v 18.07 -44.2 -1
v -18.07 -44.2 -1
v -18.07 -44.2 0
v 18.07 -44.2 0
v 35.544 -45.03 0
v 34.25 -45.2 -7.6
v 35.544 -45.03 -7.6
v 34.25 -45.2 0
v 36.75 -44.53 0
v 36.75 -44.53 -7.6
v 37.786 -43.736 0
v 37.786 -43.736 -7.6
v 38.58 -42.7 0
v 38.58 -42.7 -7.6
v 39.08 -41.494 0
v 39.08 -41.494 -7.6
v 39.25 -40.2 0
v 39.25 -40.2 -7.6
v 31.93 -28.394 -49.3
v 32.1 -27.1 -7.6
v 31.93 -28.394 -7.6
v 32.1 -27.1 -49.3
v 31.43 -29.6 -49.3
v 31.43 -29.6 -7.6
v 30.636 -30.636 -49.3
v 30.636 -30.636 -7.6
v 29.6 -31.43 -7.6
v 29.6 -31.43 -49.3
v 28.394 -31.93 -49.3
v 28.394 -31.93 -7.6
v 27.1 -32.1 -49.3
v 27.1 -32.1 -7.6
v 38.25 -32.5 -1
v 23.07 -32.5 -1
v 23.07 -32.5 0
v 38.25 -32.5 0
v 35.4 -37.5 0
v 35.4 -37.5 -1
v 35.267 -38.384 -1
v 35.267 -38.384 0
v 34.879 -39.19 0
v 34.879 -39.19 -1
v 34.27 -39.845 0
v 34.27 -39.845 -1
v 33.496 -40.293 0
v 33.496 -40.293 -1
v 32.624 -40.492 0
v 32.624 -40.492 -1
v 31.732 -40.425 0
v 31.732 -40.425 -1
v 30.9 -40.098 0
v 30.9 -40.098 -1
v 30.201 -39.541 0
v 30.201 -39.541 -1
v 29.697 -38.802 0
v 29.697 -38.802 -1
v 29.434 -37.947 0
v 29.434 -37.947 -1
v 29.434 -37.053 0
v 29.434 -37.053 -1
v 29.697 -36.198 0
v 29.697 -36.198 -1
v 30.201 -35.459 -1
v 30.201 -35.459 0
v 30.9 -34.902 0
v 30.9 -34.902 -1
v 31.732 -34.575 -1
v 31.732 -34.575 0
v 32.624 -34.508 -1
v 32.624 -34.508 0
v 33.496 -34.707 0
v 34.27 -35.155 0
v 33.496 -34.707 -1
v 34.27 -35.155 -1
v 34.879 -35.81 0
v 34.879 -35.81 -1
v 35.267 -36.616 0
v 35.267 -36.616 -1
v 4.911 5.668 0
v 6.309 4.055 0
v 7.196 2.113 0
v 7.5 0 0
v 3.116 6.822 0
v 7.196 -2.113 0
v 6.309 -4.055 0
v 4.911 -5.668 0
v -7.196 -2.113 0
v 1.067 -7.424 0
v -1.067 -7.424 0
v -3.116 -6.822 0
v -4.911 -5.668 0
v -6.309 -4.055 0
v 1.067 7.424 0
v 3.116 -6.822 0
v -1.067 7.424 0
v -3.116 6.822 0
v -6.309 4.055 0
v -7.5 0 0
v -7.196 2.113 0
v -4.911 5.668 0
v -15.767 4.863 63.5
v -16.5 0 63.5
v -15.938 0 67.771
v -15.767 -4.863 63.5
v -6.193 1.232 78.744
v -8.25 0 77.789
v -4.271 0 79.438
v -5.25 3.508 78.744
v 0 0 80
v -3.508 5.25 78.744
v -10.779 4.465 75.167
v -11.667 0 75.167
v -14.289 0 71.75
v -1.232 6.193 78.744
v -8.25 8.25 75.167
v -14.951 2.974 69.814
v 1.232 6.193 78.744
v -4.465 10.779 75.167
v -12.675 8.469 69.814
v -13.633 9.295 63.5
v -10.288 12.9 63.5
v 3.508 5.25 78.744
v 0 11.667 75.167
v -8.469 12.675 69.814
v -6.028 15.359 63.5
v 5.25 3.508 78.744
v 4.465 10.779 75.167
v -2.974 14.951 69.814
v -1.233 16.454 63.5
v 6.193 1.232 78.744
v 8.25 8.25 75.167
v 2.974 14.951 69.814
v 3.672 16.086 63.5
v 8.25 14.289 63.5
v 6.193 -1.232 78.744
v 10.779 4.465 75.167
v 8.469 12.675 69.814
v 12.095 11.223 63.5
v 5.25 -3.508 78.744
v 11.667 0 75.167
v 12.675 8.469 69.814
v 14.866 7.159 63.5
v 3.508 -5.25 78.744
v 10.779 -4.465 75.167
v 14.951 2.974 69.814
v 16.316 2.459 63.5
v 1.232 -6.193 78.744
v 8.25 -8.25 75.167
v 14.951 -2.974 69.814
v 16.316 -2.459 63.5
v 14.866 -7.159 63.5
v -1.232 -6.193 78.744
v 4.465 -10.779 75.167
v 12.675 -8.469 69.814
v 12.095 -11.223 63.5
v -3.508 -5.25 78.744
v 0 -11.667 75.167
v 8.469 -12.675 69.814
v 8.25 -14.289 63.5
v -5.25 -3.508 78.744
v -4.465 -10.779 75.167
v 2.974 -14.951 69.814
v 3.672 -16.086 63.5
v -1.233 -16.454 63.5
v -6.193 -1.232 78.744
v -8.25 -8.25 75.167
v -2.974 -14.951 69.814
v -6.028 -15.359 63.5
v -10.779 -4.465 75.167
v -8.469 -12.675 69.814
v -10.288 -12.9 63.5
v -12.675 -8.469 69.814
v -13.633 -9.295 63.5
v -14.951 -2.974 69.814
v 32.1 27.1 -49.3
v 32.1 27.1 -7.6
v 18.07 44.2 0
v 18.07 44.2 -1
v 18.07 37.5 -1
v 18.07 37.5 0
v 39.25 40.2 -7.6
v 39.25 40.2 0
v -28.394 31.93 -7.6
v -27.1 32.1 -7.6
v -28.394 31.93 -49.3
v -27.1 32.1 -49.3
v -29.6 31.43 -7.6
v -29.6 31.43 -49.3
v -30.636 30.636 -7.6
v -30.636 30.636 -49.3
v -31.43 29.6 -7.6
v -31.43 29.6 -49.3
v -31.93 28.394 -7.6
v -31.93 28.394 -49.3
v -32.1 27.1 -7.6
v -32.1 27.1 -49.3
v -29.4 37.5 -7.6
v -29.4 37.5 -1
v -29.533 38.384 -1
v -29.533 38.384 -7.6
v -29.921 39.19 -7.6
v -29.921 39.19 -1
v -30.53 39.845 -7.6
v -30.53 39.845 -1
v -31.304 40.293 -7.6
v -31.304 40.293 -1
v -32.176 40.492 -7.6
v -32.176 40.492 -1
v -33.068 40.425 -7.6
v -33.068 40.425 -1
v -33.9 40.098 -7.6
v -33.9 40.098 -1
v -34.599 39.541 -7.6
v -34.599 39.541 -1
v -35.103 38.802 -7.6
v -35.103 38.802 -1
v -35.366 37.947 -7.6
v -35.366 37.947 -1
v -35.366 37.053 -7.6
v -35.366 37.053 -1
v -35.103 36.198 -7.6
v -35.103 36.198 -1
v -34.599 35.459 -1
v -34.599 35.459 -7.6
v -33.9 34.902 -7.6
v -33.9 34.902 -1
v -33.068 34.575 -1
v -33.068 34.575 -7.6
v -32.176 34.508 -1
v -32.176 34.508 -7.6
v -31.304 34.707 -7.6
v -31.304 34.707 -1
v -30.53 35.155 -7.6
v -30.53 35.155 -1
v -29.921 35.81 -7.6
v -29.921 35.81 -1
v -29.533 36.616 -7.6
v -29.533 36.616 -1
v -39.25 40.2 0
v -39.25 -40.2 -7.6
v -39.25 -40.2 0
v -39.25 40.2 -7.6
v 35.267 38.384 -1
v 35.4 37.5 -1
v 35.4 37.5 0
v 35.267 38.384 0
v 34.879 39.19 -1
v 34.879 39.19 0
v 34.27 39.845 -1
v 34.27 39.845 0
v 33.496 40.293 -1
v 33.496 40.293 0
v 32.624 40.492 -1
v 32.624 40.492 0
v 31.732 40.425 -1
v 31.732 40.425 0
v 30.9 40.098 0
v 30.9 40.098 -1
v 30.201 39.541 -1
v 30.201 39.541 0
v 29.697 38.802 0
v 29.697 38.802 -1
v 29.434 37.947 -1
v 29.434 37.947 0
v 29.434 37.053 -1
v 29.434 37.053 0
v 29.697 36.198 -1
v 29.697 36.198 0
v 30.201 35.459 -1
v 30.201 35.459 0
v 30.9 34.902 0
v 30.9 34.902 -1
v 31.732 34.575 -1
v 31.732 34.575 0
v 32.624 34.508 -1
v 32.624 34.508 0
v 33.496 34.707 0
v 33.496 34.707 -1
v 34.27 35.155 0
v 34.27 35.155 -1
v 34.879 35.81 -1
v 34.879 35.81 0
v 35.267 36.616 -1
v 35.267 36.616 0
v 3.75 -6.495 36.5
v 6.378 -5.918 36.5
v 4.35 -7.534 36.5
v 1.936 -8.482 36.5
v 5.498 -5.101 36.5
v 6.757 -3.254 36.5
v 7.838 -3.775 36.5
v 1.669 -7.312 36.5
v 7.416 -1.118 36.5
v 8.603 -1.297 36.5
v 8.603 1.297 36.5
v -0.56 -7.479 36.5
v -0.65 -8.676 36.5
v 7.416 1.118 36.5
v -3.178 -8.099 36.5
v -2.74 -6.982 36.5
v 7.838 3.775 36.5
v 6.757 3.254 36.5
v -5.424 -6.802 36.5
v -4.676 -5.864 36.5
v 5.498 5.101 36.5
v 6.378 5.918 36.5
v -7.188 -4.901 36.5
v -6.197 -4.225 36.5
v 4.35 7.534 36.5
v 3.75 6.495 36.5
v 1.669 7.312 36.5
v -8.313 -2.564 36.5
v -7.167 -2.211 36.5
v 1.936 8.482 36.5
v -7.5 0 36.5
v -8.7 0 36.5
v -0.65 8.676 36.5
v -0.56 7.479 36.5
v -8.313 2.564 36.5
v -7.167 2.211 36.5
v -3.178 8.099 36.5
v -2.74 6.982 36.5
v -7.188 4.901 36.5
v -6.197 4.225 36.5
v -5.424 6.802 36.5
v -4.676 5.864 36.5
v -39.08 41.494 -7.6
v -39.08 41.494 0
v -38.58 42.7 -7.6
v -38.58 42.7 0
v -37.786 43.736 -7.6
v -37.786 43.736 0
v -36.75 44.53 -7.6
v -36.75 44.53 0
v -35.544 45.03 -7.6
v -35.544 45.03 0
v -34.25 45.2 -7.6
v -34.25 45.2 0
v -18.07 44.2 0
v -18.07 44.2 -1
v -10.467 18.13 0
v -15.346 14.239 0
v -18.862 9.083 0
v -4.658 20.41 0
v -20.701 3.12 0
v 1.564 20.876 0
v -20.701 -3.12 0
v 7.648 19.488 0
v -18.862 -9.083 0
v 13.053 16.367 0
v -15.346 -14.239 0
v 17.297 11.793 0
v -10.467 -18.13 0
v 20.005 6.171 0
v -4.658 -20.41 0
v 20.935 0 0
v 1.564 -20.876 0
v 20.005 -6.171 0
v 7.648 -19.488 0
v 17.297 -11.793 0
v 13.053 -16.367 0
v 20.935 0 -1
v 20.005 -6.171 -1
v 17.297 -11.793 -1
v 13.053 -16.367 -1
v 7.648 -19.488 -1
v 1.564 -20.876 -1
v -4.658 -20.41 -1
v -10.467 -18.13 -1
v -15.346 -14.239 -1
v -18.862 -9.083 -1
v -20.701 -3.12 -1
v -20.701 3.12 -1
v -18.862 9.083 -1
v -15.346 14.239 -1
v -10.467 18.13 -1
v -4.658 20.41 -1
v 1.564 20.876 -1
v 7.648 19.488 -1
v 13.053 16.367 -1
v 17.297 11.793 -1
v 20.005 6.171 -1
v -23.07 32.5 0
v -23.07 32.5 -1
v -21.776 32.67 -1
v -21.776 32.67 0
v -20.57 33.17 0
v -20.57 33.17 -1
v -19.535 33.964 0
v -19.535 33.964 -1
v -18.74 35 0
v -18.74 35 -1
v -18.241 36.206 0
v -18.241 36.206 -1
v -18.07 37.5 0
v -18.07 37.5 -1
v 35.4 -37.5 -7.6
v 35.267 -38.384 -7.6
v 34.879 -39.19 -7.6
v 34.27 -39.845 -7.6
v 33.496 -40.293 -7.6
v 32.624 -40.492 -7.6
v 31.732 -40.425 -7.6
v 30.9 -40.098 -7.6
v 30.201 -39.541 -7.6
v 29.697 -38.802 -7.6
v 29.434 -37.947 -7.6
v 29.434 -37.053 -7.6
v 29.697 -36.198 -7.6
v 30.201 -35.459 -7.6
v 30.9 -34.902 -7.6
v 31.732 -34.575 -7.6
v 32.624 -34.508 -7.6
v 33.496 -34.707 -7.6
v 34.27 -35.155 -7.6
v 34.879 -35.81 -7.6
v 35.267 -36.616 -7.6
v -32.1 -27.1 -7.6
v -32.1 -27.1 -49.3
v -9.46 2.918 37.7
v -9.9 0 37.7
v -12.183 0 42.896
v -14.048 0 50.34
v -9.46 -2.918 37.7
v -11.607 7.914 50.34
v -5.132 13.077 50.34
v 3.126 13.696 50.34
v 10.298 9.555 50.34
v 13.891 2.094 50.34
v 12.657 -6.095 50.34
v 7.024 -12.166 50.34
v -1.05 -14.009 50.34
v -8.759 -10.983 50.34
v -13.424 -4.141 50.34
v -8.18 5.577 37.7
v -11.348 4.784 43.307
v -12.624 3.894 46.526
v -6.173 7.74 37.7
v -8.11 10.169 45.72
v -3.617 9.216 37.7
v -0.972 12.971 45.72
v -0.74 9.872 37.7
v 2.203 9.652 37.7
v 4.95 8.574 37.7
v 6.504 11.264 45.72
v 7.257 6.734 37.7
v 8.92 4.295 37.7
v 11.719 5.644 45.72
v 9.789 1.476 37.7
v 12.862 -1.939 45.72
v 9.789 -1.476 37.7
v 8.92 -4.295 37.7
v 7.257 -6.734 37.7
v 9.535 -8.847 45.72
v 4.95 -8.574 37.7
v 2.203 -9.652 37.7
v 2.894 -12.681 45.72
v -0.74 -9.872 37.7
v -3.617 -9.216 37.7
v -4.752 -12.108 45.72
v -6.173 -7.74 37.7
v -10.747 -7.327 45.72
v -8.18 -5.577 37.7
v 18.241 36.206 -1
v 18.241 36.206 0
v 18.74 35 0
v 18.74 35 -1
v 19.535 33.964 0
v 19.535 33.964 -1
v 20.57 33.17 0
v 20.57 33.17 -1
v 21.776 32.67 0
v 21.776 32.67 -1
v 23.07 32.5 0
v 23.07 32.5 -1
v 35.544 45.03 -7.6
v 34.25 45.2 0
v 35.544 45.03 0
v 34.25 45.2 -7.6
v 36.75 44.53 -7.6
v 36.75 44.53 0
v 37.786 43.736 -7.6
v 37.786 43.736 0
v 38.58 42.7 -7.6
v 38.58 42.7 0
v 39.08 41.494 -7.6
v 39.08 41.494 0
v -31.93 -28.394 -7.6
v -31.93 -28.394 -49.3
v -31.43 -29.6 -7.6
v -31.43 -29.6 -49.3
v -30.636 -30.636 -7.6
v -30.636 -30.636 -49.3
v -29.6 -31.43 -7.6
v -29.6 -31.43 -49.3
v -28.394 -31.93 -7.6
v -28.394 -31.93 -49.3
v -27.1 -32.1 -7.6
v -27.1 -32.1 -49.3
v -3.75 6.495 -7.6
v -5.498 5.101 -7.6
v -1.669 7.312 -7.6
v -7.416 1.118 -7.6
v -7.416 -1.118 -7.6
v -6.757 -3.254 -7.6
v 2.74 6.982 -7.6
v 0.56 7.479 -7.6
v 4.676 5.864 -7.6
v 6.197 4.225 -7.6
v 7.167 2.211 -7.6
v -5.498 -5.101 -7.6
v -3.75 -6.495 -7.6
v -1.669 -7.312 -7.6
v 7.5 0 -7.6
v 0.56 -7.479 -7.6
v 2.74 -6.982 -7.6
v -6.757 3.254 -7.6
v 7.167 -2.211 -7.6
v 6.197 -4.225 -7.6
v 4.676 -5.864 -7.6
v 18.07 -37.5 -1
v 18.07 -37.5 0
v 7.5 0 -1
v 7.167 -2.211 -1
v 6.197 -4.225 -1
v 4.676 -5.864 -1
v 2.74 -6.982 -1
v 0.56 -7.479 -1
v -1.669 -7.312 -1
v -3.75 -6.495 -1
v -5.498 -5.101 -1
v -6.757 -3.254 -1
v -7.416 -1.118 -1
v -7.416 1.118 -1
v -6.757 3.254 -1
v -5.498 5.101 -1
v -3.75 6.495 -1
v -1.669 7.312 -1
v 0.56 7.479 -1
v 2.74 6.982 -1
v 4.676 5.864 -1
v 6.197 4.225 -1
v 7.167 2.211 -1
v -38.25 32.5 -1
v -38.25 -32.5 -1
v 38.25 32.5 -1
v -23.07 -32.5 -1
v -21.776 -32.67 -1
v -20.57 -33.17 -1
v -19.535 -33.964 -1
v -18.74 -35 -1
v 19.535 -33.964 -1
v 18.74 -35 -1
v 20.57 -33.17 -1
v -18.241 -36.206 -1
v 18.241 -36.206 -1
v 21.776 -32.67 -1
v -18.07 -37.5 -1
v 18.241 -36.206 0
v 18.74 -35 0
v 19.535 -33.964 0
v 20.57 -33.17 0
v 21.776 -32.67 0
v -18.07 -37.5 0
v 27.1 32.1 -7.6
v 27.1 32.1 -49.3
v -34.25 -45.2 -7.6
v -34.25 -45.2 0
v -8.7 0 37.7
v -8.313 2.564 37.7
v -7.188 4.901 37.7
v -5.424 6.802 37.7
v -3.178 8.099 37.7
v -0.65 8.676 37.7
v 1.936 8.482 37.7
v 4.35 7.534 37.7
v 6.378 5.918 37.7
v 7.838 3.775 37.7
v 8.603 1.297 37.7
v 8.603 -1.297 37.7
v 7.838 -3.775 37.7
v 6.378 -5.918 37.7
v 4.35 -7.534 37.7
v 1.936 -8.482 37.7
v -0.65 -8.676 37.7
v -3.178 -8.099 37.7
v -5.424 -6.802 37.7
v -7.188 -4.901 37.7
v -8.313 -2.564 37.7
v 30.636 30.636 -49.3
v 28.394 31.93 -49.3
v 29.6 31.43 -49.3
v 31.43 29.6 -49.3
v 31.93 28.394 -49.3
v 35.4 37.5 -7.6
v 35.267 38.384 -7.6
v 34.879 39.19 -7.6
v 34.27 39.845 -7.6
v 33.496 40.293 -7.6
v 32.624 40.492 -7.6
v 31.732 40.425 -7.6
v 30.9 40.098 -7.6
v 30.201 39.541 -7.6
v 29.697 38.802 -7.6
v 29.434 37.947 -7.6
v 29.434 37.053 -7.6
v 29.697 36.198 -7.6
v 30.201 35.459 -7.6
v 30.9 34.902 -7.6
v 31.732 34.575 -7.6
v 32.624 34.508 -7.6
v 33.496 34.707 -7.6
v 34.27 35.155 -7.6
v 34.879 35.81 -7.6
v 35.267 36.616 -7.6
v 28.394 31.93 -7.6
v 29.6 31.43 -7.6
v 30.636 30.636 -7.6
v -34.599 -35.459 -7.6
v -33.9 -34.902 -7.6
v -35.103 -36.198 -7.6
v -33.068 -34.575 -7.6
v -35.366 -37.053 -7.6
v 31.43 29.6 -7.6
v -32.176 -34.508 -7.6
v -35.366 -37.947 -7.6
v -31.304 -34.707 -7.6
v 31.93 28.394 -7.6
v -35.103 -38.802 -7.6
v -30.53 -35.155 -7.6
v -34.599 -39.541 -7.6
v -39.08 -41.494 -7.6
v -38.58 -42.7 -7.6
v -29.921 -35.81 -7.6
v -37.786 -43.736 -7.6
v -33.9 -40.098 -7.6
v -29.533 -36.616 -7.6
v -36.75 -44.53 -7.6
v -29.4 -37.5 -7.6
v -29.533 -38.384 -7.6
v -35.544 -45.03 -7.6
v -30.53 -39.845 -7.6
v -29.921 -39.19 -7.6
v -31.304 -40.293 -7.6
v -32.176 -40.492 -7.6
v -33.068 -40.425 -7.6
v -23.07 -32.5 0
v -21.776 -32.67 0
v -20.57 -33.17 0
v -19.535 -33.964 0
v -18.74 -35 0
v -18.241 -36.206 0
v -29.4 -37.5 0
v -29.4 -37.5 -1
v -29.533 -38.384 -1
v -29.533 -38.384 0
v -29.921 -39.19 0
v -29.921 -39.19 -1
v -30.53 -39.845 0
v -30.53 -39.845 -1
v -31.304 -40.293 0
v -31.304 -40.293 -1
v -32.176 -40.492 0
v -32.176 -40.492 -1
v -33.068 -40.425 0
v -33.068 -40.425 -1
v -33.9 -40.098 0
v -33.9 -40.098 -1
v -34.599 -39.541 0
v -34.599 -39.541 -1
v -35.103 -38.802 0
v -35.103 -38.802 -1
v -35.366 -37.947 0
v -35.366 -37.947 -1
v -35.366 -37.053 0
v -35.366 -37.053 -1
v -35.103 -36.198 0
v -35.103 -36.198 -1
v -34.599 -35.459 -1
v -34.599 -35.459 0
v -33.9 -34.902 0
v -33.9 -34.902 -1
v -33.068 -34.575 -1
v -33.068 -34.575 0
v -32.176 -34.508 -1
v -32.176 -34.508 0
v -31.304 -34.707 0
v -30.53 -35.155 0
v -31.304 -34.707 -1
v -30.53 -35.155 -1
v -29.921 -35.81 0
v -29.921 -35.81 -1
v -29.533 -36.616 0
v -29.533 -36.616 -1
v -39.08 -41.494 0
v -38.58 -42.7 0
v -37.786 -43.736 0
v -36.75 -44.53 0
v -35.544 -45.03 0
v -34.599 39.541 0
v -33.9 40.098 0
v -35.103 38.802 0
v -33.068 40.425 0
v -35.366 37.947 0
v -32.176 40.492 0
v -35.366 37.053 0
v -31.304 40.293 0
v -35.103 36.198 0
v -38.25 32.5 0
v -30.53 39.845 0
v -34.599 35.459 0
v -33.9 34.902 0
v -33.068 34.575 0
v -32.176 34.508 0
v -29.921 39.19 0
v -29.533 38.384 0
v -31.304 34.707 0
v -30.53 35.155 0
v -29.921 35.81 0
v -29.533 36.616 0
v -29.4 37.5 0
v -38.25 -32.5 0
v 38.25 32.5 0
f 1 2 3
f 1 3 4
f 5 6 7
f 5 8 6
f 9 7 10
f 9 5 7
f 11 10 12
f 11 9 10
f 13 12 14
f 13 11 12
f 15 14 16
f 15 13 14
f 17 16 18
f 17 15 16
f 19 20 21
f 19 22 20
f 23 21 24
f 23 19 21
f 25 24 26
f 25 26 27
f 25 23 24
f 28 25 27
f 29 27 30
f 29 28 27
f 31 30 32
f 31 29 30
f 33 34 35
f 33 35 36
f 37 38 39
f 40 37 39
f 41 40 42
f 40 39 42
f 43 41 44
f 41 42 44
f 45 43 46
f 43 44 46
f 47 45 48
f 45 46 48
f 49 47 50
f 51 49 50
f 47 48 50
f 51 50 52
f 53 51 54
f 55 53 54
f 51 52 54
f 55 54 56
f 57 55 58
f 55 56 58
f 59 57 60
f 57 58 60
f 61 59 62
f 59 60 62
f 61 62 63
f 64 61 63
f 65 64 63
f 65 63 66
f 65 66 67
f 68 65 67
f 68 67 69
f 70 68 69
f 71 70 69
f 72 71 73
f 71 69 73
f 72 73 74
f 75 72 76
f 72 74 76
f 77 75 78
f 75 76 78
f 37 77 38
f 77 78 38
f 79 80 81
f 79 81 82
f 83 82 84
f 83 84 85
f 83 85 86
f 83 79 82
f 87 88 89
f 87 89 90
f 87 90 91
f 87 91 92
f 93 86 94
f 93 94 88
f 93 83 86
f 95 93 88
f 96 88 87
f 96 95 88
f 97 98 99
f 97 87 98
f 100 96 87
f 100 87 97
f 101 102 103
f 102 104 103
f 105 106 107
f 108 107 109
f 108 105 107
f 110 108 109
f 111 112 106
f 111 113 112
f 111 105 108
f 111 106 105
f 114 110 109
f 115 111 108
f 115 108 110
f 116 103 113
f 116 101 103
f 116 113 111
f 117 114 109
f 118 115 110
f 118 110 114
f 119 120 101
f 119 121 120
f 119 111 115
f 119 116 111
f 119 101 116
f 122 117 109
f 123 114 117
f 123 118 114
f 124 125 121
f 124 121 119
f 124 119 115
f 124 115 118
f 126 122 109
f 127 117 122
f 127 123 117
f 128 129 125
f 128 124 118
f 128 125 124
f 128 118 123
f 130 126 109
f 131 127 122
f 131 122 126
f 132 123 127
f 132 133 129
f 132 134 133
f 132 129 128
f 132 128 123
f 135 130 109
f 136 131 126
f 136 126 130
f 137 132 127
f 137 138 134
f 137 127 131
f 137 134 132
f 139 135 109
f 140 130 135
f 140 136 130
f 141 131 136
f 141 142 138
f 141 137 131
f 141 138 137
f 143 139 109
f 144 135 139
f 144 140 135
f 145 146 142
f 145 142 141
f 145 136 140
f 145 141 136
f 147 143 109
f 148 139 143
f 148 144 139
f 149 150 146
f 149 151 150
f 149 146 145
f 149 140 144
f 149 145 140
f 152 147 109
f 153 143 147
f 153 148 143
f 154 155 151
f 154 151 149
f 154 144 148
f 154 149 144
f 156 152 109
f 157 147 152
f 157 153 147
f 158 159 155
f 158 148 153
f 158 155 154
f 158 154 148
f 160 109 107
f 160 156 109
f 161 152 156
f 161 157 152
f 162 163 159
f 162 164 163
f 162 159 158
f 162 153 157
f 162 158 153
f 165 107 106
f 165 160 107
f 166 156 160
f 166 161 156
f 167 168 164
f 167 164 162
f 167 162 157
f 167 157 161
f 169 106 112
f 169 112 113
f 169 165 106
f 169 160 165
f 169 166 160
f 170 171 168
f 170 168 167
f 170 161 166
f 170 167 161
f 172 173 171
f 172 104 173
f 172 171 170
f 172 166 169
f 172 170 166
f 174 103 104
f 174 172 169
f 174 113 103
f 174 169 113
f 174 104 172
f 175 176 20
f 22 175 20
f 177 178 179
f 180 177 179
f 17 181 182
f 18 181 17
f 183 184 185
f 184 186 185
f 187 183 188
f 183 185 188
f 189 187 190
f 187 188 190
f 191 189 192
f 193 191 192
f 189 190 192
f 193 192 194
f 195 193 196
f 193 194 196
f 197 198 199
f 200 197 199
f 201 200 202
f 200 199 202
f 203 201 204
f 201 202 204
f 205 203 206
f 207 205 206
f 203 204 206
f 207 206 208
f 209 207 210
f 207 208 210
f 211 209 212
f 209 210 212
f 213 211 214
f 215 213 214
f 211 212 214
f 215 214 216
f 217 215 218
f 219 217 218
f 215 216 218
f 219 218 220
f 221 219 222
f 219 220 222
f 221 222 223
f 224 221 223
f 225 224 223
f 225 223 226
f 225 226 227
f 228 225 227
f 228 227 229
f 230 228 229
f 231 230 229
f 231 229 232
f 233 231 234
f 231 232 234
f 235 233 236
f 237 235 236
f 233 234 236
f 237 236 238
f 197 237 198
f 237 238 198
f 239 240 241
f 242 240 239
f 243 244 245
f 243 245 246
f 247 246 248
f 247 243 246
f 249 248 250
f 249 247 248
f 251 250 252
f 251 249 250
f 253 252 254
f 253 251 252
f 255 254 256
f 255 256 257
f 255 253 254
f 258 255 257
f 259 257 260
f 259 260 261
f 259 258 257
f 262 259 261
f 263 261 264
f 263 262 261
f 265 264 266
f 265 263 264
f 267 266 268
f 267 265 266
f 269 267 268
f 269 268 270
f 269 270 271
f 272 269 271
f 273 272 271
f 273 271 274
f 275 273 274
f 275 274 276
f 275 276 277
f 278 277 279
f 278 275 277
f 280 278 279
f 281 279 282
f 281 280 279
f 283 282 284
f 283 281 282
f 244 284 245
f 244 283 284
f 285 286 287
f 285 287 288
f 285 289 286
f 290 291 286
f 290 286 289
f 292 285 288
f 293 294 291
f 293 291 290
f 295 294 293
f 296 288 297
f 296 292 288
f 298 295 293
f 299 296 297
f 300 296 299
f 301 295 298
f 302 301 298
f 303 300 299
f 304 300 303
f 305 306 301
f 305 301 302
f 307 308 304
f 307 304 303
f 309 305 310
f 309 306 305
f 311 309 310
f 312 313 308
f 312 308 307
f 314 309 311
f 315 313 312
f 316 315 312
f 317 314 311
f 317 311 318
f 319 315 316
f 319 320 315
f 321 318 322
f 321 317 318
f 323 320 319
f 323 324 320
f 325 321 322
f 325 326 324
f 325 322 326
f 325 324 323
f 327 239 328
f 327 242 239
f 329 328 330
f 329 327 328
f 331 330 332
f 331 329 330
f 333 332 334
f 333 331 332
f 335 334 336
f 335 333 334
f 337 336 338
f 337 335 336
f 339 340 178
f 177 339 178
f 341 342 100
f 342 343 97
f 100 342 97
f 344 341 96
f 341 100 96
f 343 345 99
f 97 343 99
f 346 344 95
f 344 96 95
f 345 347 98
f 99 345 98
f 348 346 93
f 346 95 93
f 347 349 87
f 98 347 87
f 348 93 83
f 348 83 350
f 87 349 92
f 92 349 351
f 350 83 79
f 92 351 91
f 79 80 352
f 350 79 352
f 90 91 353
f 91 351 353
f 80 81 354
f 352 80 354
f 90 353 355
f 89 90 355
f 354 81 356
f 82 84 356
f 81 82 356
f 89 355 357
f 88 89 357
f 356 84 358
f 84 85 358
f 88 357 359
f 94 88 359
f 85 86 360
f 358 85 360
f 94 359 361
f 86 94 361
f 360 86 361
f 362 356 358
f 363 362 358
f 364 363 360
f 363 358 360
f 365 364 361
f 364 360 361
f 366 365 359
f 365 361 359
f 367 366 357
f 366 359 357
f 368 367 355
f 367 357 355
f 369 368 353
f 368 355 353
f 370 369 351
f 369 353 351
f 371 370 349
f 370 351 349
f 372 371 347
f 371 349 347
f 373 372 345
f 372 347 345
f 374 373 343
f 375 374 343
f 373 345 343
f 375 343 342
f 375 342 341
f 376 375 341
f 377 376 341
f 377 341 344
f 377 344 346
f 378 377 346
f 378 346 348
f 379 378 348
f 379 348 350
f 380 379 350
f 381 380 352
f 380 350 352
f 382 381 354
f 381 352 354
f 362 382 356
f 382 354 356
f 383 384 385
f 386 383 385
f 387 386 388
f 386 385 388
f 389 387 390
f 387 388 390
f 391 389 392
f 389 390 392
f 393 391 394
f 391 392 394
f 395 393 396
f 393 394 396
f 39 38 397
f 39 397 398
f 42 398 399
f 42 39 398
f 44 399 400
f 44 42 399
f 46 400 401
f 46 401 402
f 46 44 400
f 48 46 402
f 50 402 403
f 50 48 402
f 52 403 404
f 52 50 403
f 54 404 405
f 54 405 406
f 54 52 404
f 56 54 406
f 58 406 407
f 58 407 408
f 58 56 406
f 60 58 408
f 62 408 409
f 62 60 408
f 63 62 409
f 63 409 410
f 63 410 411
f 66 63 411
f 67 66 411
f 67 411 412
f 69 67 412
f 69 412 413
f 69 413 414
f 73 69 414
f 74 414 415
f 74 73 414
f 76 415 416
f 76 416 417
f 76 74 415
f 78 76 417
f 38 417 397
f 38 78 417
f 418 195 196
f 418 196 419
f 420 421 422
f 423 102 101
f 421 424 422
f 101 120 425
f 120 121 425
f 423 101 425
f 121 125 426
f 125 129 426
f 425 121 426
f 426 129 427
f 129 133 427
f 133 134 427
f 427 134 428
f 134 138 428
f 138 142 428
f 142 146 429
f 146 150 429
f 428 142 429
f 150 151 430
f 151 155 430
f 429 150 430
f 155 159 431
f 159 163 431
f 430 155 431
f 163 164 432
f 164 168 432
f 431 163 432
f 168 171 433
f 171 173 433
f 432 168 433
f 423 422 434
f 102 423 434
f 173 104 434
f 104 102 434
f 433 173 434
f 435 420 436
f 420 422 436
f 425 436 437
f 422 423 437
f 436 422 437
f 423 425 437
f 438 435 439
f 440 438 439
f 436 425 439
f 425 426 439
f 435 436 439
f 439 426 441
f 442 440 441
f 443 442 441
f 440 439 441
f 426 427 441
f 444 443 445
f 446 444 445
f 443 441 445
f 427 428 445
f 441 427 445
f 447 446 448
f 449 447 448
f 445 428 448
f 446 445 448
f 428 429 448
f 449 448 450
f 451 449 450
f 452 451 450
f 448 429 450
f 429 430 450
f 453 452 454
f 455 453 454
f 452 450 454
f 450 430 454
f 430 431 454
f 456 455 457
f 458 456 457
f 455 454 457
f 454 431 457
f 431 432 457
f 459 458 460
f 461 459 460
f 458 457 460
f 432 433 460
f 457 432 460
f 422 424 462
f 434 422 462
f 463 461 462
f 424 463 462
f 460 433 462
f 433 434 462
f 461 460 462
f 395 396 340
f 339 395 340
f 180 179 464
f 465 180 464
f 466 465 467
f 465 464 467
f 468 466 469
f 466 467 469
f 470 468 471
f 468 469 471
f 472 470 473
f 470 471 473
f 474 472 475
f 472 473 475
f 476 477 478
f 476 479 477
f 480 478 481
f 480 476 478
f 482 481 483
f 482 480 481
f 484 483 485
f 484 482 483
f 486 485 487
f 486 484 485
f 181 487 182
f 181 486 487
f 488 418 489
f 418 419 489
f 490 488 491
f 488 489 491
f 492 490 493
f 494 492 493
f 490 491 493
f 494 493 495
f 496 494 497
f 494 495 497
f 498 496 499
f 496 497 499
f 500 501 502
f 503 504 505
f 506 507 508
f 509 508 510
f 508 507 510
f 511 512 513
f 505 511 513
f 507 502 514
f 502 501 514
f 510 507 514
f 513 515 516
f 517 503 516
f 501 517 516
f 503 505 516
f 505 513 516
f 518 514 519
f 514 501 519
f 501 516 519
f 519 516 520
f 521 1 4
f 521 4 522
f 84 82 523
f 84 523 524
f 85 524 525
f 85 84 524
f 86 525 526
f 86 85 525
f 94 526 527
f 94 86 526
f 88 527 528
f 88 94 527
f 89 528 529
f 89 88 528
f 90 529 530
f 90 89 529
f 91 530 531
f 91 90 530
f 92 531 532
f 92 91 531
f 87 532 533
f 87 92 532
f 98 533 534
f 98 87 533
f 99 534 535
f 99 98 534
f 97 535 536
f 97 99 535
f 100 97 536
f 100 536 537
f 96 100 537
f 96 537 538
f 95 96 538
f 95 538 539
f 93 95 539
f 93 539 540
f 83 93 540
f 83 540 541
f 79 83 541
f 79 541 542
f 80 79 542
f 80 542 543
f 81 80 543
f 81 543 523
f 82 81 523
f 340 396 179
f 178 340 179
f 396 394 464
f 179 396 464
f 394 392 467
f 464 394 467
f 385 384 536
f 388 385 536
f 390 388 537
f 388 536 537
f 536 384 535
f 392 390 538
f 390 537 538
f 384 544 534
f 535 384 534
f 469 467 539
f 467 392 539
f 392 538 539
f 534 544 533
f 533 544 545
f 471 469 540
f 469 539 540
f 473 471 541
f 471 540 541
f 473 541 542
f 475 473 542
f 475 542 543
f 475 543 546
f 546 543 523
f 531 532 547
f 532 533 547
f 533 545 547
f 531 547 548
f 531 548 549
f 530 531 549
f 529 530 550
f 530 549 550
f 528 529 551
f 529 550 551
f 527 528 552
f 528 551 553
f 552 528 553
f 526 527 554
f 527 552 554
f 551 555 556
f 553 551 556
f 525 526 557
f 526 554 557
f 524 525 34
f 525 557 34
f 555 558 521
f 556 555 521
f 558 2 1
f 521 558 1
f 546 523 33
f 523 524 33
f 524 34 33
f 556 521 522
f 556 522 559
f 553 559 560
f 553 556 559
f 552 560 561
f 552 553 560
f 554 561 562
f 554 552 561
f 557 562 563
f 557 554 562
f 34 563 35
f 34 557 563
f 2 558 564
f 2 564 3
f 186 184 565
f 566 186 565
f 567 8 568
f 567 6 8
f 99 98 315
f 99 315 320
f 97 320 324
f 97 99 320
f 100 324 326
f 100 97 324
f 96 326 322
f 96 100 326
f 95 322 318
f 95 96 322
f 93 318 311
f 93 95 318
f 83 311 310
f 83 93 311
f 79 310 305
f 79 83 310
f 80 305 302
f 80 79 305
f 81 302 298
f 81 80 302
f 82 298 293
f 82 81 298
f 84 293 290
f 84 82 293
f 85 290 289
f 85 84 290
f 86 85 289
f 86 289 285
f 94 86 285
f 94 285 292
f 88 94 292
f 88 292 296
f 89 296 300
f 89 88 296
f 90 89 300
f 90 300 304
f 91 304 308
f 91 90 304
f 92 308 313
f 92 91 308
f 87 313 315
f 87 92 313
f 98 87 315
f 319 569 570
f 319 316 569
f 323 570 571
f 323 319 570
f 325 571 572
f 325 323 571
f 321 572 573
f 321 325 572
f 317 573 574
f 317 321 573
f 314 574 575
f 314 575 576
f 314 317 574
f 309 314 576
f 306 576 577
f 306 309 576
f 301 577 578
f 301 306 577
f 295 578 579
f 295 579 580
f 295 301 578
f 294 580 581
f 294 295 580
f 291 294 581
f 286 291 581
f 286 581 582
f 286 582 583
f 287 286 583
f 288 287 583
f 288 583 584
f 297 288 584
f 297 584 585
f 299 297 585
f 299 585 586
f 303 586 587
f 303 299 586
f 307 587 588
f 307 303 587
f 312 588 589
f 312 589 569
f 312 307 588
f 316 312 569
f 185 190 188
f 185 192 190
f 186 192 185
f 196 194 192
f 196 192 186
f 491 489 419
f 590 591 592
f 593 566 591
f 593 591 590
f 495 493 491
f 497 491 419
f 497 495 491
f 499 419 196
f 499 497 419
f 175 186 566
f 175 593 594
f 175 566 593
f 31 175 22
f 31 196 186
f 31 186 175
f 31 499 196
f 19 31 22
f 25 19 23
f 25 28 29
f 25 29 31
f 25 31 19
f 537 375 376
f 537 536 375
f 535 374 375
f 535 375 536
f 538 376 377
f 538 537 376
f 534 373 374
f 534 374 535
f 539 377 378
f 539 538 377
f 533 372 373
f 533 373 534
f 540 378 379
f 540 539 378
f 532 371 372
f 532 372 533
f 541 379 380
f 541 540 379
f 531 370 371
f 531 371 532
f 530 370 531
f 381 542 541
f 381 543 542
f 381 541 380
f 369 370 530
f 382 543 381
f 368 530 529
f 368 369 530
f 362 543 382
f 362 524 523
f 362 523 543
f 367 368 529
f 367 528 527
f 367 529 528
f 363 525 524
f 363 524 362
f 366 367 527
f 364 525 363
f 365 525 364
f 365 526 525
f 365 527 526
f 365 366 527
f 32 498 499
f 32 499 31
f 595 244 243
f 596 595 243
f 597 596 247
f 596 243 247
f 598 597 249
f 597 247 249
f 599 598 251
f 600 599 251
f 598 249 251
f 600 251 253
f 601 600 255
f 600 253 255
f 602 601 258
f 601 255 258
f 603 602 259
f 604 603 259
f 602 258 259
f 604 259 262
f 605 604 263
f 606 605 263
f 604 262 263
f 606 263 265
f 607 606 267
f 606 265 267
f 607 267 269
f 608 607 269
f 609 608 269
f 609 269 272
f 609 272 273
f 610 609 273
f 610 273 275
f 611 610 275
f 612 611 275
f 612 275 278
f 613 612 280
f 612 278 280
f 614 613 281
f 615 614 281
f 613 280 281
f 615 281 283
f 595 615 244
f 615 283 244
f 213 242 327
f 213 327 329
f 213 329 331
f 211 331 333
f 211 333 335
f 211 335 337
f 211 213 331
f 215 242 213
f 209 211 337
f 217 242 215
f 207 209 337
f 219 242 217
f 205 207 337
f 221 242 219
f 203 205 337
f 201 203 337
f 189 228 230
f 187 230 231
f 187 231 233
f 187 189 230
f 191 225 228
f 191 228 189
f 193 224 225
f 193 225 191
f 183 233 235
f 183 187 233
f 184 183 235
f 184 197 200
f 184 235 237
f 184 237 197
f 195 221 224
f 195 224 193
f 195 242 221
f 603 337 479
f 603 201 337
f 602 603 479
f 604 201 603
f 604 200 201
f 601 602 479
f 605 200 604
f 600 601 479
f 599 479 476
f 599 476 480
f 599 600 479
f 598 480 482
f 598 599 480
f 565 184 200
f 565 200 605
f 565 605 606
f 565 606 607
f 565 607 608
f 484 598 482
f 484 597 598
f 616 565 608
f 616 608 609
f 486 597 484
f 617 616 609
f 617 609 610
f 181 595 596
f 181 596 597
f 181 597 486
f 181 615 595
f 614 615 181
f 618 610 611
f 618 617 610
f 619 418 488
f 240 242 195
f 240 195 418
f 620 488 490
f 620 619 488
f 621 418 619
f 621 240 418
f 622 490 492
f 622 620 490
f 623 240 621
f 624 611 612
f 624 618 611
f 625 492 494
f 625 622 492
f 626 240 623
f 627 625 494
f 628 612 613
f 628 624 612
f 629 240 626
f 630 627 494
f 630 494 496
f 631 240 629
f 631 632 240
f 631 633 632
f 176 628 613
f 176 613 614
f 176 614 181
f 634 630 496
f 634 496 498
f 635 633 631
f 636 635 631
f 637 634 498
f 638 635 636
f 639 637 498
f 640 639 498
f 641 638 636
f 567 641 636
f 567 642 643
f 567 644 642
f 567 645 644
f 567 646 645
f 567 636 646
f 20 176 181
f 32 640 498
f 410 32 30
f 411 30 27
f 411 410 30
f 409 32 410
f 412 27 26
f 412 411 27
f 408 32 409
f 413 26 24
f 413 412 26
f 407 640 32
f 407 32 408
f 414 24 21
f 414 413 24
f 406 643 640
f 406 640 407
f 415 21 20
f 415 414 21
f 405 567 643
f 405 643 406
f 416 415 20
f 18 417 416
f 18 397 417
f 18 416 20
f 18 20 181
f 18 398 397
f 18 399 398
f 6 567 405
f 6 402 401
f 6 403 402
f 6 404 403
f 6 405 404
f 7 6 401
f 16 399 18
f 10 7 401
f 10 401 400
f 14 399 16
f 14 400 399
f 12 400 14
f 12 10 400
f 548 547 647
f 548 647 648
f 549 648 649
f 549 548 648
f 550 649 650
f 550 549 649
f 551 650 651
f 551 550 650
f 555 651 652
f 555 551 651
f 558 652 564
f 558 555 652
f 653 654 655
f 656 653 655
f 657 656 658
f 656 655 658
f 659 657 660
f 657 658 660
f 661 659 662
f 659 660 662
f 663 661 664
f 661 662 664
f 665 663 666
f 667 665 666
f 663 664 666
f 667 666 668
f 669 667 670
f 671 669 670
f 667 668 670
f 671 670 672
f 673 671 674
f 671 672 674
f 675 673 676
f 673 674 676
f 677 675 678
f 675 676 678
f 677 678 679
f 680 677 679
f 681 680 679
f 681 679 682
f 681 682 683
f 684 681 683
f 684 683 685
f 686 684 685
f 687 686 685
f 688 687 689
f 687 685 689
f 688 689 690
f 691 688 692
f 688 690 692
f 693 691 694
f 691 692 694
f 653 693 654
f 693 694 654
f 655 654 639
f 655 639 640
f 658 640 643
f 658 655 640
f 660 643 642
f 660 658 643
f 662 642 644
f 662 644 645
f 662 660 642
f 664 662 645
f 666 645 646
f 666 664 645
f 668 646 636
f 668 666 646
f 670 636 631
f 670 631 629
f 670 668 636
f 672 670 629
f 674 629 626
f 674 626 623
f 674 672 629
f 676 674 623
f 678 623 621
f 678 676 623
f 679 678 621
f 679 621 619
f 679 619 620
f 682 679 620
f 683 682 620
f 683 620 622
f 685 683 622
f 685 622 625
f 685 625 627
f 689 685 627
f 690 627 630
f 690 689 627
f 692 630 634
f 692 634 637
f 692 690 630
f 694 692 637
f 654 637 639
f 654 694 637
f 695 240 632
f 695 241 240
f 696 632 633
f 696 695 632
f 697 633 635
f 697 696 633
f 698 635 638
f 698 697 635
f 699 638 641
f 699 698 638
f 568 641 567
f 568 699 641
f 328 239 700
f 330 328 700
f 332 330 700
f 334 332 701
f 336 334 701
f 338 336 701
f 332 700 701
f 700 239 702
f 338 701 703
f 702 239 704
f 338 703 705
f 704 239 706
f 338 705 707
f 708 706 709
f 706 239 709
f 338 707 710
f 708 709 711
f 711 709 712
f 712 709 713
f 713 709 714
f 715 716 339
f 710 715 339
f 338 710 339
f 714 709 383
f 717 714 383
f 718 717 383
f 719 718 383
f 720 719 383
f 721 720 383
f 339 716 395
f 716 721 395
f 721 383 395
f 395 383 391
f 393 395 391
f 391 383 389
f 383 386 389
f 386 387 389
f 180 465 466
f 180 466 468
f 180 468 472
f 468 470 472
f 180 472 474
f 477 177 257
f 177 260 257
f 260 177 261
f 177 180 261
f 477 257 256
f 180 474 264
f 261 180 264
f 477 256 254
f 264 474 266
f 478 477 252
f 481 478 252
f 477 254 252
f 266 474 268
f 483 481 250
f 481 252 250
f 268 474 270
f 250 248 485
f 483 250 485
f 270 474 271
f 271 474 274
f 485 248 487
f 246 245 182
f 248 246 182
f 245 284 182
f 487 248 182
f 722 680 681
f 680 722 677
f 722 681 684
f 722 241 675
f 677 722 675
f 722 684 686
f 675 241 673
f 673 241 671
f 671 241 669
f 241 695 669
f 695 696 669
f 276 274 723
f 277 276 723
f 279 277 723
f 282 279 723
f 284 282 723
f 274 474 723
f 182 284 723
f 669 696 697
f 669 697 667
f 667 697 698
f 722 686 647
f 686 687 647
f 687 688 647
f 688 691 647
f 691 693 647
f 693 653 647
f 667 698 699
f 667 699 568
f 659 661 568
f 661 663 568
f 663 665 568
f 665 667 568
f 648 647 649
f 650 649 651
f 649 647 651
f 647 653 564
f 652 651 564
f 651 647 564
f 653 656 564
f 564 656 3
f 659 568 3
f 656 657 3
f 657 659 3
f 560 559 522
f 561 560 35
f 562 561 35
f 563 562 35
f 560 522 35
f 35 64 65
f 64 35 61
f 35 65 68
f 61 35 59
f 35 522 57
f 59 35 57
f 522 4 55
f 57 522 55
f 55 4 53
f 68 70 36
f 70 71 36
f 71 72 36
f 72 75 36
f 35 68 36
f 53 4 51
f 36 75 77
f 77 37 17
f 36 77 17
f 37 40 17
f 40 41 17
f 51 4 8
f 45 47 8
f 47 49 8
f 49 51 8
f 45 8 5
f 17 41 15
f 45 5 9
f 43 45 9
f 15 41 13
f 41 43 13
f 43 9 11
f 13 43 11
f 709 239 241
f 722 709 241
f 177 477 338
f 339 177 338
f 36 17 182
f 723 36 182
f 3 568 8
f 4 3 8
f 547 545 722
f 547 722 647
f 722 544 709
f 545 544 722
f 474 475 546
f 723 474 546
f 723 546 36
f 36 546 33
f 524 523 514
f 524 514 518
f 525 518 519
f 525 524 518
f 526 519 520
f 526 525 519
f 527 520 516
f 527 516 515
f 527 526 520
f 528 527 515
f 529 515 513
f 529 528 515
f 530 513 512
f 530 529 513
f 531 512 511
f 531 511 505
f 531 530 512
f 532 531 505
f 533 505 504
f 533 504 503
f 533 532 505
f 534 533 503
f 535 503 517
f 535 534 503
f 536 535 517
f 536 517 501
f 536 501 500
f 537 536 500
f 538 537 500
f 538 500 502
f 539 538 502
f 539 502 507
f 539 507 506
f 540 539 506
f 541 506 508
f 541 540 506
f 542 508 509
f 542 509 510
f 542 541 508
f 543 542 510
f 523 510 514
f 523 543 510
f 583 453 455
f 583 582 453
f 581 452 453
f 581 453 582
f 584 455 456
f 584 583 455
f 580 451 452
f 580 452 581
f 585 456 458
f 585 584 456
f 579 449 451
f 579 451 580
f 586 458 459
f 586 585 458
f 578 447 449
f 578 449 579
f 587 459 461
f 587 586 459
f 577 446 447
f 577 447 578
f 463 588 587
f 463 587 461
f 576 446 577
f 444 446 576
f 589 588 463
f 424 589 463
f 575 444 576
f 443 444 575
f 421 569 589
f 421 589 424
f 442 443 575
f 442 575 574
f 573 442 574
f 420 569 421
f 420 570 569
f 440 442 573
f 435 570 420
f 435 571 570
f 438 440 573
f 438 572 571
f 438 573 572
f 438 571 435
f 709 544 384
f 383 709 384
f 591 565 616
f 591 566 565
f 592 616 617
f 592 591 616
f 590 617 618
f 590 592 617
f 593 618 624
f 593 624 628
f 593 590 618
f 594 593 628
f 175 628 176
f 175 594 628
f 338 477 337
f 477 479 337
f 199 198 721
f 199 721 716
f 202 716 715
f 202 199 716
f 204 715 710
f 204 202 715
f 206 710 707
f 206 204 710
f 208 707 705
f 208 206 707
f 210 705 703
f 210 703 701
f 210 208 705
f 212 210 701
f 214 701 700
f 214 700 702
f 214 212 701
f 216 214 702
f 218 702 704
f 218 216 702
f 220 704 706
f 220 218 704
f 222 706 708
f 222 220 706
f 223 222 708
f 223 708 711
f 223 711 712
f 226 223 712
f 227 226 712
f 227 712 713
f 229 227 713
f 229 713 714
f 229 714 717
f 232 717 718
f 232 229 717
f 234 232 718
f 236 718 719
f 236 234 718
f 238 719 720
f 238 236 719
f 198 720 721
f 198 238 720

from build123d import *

# Parameters (mm, degrees)
F2_R      = 20.9347351309
F2_R_2    = 7.5
F3_DEPTH  = 1
F4_W      = 78.5
F4_H      = 90.4
F4_R      = 20.9347351309
F4_R_2    = 7.5
F5_DEPTH  = 6.6
F6_W      = 64.2
F6_H      = 64.2
F7_DEPTH  = 41.7
F8_R      = 3
F8_W      = 36.1407659948
F8_H      = 1
F8_W_2    = 1
F8_H_2    = 32.5
F9_DEPTH  = 1
F11_DEPTH = 6.6
F12_R     = 5


with BuildPart() as f1:
    # F0 (on Front) → F1 (revolve)
    with BuildSketch(Plane.XZ):
        with BuildLine():
            Line((-7.5, 0), (0, 0))
            Line((0, 0), (0, 80))
            ThreePointArc((0, 80), (-11.6672618896, 75.1672618896), (-16.5, 63.5))
            add(Edge.make_bspline(
                [(-9.9, 37.7), (-13.9195526105, 44.3828629705), (-14.7425273766, 56.1243776542), (-16.5, 63.5)],
                knots=[0, 0, 0, 0, 26.6308092254, 26.6308092254, 26.6308092254, 26.6308092254], degree=3))
            Line((-9.9, 37.7), (-8.7, 37.7))
            Line((-8.7, 37.7), (-8.7, 36.5))
            Line((-8.7, 36.5), (-7.5, 36.5))
            Line((-7.5, 36.5), (-7.5, 0))
        make_face()
    revolve(axis=Axis((0, 0, 59.7419515252), (0, 0, -1)))

    # F2 (on face) → F3 (join)
    with BuildSketch(Plane(origin=(0, 0, 0), x_dir=(1, 0, 0), z_dir=(0, 0, -1))):
        Circle(F2_R)
        Circle(F2_R_2, mode=Mode.SUBTRACT)
    extrude(amount=F3_DEPTH)


with BuildPart() as f5:
    # F4 (on face) → F5 (new body)
    with BuildSketch(Plane(origin=(0, 0, -1), x_dir=(1, 0, 0), z_dir=(0, 0, -1))):
        Rectangle(F4_W, F4_H)
        Circle(F4_R, mode=Mode.SUBTRACT)
        Circle(F4_R)
        Circle(F4_R_2, mode=Mode.SUBTRACT)
    extrude(amount=F5_DEPTH)

    # F6 (on face) → F7 (join)
    with BuildSketch(Plane(origin=(0, 0, -7.6), x_dir=(1, 0, 0), z_dir=(0, 0, -1))):
        Rectangle(F6_W, F6_H)
    extrude(amount=F7_DEPTH)



with BuildPart() as f9:
    # F8 (on face) → F9 (new body)
    with BuildSketch(Plane.XY.offset(-1)):
        with BuildLine():
            Line((-39.25, 45.2), (-39.25, 32.5))
            Line((-39.25, 32.5), (-38.25, 32.5))
            Line((-38.25, 32.5), (-23.0703829974, 32.5))
            ThreePointArc((-23.0703829974, 32.5), (-19.5348490915, 33.9644660941), (-18.0703829974, 37.5))
            Line((-18.0703829974, 37.5), (-18.0703829974, 44.2))
            Line((-18.0703829974, 44.2), (-18.0703829974, 45.2))
            Line((-18.0703829974, 45.2), (-39.25, 45.2))
        make_face()
        with Locations((-32.4, 37.5)):
            Circle(F8_R, mode=Mode.SUBTRACT)
        with BuildLine():
            Line((39.25, 45.2), (18.0703829974, 45.2))
            Line((18.0703829974, 45.2), (18.0703829974, 44.2))
            Line((18.0703829974, 44.2), (18.0703829974, 37.5))
            ThreePointArc((18.0703829974, 37.5), (19.5348490915, 33.9644660941), (23.0703829974, 32.5))
            Line((23.0703829974, 32.5), (38.25, 32.5))
            Line((38.25, 32.5), (39.25, 32.5))
            Line((39.25, 32.5), (39.25, 45.2))
        make_face()
        with Locations((32.4, 37.5)):
            Circle(F8_R, mode=Mode.SUBTRACT)
        with Locations((0, 44.7)):
            Rectangle(F8_W, F8_H)
        with Locations((-38.75, 16.25)):
            Rectangle(F8_W_2, F8_H_2)
        with Locations((38.75, 16.25)):
            Rectangle(F8_W_2, F8_H_2)
    extrude(amount=F9_DEPTH)


with BuildPart() as f5_1:
    add(f5.part)

    add(f9.part)  # F10 merges F9
    # F10: F9 across plane
    add(f9.part.mirror(Plane.XZ))

    # F11 (cut, through all): faces of the model
    f11_faces = [f5_1.faces().sort_by_distance(p)[0] for p in [
        (-32.4, 37.5, -1),
        (32.4, 37.5, -1),
        (-32.4, -37.5, -1),
        (32.4, -37.5, -1),
    ]]
    extrude(f11_faces, amount=-F11_DEPTH, mode=Mode.SUBTRACT)

    # F12
    f12_edges = [f5_1.edges().sort_by_distance(p)[0] for p in [
        (-39.25, -45.2, -3.8),
        (39.25, -45.2, -3.8),
        (39.25, 45.2, -3.8),
        (-39.25, 45.2, -3.8),
        (-32.1, -32.1, -28.45),
        (-32.1, 32.1, -28.45),
        (32.1, -32.1, -28.45),
        (32.1, 32.1, -28.45),
    ]]
    fillet(f12_edges, radius=F12_R)


solid = Compound([f1.part, f5_1.part])
